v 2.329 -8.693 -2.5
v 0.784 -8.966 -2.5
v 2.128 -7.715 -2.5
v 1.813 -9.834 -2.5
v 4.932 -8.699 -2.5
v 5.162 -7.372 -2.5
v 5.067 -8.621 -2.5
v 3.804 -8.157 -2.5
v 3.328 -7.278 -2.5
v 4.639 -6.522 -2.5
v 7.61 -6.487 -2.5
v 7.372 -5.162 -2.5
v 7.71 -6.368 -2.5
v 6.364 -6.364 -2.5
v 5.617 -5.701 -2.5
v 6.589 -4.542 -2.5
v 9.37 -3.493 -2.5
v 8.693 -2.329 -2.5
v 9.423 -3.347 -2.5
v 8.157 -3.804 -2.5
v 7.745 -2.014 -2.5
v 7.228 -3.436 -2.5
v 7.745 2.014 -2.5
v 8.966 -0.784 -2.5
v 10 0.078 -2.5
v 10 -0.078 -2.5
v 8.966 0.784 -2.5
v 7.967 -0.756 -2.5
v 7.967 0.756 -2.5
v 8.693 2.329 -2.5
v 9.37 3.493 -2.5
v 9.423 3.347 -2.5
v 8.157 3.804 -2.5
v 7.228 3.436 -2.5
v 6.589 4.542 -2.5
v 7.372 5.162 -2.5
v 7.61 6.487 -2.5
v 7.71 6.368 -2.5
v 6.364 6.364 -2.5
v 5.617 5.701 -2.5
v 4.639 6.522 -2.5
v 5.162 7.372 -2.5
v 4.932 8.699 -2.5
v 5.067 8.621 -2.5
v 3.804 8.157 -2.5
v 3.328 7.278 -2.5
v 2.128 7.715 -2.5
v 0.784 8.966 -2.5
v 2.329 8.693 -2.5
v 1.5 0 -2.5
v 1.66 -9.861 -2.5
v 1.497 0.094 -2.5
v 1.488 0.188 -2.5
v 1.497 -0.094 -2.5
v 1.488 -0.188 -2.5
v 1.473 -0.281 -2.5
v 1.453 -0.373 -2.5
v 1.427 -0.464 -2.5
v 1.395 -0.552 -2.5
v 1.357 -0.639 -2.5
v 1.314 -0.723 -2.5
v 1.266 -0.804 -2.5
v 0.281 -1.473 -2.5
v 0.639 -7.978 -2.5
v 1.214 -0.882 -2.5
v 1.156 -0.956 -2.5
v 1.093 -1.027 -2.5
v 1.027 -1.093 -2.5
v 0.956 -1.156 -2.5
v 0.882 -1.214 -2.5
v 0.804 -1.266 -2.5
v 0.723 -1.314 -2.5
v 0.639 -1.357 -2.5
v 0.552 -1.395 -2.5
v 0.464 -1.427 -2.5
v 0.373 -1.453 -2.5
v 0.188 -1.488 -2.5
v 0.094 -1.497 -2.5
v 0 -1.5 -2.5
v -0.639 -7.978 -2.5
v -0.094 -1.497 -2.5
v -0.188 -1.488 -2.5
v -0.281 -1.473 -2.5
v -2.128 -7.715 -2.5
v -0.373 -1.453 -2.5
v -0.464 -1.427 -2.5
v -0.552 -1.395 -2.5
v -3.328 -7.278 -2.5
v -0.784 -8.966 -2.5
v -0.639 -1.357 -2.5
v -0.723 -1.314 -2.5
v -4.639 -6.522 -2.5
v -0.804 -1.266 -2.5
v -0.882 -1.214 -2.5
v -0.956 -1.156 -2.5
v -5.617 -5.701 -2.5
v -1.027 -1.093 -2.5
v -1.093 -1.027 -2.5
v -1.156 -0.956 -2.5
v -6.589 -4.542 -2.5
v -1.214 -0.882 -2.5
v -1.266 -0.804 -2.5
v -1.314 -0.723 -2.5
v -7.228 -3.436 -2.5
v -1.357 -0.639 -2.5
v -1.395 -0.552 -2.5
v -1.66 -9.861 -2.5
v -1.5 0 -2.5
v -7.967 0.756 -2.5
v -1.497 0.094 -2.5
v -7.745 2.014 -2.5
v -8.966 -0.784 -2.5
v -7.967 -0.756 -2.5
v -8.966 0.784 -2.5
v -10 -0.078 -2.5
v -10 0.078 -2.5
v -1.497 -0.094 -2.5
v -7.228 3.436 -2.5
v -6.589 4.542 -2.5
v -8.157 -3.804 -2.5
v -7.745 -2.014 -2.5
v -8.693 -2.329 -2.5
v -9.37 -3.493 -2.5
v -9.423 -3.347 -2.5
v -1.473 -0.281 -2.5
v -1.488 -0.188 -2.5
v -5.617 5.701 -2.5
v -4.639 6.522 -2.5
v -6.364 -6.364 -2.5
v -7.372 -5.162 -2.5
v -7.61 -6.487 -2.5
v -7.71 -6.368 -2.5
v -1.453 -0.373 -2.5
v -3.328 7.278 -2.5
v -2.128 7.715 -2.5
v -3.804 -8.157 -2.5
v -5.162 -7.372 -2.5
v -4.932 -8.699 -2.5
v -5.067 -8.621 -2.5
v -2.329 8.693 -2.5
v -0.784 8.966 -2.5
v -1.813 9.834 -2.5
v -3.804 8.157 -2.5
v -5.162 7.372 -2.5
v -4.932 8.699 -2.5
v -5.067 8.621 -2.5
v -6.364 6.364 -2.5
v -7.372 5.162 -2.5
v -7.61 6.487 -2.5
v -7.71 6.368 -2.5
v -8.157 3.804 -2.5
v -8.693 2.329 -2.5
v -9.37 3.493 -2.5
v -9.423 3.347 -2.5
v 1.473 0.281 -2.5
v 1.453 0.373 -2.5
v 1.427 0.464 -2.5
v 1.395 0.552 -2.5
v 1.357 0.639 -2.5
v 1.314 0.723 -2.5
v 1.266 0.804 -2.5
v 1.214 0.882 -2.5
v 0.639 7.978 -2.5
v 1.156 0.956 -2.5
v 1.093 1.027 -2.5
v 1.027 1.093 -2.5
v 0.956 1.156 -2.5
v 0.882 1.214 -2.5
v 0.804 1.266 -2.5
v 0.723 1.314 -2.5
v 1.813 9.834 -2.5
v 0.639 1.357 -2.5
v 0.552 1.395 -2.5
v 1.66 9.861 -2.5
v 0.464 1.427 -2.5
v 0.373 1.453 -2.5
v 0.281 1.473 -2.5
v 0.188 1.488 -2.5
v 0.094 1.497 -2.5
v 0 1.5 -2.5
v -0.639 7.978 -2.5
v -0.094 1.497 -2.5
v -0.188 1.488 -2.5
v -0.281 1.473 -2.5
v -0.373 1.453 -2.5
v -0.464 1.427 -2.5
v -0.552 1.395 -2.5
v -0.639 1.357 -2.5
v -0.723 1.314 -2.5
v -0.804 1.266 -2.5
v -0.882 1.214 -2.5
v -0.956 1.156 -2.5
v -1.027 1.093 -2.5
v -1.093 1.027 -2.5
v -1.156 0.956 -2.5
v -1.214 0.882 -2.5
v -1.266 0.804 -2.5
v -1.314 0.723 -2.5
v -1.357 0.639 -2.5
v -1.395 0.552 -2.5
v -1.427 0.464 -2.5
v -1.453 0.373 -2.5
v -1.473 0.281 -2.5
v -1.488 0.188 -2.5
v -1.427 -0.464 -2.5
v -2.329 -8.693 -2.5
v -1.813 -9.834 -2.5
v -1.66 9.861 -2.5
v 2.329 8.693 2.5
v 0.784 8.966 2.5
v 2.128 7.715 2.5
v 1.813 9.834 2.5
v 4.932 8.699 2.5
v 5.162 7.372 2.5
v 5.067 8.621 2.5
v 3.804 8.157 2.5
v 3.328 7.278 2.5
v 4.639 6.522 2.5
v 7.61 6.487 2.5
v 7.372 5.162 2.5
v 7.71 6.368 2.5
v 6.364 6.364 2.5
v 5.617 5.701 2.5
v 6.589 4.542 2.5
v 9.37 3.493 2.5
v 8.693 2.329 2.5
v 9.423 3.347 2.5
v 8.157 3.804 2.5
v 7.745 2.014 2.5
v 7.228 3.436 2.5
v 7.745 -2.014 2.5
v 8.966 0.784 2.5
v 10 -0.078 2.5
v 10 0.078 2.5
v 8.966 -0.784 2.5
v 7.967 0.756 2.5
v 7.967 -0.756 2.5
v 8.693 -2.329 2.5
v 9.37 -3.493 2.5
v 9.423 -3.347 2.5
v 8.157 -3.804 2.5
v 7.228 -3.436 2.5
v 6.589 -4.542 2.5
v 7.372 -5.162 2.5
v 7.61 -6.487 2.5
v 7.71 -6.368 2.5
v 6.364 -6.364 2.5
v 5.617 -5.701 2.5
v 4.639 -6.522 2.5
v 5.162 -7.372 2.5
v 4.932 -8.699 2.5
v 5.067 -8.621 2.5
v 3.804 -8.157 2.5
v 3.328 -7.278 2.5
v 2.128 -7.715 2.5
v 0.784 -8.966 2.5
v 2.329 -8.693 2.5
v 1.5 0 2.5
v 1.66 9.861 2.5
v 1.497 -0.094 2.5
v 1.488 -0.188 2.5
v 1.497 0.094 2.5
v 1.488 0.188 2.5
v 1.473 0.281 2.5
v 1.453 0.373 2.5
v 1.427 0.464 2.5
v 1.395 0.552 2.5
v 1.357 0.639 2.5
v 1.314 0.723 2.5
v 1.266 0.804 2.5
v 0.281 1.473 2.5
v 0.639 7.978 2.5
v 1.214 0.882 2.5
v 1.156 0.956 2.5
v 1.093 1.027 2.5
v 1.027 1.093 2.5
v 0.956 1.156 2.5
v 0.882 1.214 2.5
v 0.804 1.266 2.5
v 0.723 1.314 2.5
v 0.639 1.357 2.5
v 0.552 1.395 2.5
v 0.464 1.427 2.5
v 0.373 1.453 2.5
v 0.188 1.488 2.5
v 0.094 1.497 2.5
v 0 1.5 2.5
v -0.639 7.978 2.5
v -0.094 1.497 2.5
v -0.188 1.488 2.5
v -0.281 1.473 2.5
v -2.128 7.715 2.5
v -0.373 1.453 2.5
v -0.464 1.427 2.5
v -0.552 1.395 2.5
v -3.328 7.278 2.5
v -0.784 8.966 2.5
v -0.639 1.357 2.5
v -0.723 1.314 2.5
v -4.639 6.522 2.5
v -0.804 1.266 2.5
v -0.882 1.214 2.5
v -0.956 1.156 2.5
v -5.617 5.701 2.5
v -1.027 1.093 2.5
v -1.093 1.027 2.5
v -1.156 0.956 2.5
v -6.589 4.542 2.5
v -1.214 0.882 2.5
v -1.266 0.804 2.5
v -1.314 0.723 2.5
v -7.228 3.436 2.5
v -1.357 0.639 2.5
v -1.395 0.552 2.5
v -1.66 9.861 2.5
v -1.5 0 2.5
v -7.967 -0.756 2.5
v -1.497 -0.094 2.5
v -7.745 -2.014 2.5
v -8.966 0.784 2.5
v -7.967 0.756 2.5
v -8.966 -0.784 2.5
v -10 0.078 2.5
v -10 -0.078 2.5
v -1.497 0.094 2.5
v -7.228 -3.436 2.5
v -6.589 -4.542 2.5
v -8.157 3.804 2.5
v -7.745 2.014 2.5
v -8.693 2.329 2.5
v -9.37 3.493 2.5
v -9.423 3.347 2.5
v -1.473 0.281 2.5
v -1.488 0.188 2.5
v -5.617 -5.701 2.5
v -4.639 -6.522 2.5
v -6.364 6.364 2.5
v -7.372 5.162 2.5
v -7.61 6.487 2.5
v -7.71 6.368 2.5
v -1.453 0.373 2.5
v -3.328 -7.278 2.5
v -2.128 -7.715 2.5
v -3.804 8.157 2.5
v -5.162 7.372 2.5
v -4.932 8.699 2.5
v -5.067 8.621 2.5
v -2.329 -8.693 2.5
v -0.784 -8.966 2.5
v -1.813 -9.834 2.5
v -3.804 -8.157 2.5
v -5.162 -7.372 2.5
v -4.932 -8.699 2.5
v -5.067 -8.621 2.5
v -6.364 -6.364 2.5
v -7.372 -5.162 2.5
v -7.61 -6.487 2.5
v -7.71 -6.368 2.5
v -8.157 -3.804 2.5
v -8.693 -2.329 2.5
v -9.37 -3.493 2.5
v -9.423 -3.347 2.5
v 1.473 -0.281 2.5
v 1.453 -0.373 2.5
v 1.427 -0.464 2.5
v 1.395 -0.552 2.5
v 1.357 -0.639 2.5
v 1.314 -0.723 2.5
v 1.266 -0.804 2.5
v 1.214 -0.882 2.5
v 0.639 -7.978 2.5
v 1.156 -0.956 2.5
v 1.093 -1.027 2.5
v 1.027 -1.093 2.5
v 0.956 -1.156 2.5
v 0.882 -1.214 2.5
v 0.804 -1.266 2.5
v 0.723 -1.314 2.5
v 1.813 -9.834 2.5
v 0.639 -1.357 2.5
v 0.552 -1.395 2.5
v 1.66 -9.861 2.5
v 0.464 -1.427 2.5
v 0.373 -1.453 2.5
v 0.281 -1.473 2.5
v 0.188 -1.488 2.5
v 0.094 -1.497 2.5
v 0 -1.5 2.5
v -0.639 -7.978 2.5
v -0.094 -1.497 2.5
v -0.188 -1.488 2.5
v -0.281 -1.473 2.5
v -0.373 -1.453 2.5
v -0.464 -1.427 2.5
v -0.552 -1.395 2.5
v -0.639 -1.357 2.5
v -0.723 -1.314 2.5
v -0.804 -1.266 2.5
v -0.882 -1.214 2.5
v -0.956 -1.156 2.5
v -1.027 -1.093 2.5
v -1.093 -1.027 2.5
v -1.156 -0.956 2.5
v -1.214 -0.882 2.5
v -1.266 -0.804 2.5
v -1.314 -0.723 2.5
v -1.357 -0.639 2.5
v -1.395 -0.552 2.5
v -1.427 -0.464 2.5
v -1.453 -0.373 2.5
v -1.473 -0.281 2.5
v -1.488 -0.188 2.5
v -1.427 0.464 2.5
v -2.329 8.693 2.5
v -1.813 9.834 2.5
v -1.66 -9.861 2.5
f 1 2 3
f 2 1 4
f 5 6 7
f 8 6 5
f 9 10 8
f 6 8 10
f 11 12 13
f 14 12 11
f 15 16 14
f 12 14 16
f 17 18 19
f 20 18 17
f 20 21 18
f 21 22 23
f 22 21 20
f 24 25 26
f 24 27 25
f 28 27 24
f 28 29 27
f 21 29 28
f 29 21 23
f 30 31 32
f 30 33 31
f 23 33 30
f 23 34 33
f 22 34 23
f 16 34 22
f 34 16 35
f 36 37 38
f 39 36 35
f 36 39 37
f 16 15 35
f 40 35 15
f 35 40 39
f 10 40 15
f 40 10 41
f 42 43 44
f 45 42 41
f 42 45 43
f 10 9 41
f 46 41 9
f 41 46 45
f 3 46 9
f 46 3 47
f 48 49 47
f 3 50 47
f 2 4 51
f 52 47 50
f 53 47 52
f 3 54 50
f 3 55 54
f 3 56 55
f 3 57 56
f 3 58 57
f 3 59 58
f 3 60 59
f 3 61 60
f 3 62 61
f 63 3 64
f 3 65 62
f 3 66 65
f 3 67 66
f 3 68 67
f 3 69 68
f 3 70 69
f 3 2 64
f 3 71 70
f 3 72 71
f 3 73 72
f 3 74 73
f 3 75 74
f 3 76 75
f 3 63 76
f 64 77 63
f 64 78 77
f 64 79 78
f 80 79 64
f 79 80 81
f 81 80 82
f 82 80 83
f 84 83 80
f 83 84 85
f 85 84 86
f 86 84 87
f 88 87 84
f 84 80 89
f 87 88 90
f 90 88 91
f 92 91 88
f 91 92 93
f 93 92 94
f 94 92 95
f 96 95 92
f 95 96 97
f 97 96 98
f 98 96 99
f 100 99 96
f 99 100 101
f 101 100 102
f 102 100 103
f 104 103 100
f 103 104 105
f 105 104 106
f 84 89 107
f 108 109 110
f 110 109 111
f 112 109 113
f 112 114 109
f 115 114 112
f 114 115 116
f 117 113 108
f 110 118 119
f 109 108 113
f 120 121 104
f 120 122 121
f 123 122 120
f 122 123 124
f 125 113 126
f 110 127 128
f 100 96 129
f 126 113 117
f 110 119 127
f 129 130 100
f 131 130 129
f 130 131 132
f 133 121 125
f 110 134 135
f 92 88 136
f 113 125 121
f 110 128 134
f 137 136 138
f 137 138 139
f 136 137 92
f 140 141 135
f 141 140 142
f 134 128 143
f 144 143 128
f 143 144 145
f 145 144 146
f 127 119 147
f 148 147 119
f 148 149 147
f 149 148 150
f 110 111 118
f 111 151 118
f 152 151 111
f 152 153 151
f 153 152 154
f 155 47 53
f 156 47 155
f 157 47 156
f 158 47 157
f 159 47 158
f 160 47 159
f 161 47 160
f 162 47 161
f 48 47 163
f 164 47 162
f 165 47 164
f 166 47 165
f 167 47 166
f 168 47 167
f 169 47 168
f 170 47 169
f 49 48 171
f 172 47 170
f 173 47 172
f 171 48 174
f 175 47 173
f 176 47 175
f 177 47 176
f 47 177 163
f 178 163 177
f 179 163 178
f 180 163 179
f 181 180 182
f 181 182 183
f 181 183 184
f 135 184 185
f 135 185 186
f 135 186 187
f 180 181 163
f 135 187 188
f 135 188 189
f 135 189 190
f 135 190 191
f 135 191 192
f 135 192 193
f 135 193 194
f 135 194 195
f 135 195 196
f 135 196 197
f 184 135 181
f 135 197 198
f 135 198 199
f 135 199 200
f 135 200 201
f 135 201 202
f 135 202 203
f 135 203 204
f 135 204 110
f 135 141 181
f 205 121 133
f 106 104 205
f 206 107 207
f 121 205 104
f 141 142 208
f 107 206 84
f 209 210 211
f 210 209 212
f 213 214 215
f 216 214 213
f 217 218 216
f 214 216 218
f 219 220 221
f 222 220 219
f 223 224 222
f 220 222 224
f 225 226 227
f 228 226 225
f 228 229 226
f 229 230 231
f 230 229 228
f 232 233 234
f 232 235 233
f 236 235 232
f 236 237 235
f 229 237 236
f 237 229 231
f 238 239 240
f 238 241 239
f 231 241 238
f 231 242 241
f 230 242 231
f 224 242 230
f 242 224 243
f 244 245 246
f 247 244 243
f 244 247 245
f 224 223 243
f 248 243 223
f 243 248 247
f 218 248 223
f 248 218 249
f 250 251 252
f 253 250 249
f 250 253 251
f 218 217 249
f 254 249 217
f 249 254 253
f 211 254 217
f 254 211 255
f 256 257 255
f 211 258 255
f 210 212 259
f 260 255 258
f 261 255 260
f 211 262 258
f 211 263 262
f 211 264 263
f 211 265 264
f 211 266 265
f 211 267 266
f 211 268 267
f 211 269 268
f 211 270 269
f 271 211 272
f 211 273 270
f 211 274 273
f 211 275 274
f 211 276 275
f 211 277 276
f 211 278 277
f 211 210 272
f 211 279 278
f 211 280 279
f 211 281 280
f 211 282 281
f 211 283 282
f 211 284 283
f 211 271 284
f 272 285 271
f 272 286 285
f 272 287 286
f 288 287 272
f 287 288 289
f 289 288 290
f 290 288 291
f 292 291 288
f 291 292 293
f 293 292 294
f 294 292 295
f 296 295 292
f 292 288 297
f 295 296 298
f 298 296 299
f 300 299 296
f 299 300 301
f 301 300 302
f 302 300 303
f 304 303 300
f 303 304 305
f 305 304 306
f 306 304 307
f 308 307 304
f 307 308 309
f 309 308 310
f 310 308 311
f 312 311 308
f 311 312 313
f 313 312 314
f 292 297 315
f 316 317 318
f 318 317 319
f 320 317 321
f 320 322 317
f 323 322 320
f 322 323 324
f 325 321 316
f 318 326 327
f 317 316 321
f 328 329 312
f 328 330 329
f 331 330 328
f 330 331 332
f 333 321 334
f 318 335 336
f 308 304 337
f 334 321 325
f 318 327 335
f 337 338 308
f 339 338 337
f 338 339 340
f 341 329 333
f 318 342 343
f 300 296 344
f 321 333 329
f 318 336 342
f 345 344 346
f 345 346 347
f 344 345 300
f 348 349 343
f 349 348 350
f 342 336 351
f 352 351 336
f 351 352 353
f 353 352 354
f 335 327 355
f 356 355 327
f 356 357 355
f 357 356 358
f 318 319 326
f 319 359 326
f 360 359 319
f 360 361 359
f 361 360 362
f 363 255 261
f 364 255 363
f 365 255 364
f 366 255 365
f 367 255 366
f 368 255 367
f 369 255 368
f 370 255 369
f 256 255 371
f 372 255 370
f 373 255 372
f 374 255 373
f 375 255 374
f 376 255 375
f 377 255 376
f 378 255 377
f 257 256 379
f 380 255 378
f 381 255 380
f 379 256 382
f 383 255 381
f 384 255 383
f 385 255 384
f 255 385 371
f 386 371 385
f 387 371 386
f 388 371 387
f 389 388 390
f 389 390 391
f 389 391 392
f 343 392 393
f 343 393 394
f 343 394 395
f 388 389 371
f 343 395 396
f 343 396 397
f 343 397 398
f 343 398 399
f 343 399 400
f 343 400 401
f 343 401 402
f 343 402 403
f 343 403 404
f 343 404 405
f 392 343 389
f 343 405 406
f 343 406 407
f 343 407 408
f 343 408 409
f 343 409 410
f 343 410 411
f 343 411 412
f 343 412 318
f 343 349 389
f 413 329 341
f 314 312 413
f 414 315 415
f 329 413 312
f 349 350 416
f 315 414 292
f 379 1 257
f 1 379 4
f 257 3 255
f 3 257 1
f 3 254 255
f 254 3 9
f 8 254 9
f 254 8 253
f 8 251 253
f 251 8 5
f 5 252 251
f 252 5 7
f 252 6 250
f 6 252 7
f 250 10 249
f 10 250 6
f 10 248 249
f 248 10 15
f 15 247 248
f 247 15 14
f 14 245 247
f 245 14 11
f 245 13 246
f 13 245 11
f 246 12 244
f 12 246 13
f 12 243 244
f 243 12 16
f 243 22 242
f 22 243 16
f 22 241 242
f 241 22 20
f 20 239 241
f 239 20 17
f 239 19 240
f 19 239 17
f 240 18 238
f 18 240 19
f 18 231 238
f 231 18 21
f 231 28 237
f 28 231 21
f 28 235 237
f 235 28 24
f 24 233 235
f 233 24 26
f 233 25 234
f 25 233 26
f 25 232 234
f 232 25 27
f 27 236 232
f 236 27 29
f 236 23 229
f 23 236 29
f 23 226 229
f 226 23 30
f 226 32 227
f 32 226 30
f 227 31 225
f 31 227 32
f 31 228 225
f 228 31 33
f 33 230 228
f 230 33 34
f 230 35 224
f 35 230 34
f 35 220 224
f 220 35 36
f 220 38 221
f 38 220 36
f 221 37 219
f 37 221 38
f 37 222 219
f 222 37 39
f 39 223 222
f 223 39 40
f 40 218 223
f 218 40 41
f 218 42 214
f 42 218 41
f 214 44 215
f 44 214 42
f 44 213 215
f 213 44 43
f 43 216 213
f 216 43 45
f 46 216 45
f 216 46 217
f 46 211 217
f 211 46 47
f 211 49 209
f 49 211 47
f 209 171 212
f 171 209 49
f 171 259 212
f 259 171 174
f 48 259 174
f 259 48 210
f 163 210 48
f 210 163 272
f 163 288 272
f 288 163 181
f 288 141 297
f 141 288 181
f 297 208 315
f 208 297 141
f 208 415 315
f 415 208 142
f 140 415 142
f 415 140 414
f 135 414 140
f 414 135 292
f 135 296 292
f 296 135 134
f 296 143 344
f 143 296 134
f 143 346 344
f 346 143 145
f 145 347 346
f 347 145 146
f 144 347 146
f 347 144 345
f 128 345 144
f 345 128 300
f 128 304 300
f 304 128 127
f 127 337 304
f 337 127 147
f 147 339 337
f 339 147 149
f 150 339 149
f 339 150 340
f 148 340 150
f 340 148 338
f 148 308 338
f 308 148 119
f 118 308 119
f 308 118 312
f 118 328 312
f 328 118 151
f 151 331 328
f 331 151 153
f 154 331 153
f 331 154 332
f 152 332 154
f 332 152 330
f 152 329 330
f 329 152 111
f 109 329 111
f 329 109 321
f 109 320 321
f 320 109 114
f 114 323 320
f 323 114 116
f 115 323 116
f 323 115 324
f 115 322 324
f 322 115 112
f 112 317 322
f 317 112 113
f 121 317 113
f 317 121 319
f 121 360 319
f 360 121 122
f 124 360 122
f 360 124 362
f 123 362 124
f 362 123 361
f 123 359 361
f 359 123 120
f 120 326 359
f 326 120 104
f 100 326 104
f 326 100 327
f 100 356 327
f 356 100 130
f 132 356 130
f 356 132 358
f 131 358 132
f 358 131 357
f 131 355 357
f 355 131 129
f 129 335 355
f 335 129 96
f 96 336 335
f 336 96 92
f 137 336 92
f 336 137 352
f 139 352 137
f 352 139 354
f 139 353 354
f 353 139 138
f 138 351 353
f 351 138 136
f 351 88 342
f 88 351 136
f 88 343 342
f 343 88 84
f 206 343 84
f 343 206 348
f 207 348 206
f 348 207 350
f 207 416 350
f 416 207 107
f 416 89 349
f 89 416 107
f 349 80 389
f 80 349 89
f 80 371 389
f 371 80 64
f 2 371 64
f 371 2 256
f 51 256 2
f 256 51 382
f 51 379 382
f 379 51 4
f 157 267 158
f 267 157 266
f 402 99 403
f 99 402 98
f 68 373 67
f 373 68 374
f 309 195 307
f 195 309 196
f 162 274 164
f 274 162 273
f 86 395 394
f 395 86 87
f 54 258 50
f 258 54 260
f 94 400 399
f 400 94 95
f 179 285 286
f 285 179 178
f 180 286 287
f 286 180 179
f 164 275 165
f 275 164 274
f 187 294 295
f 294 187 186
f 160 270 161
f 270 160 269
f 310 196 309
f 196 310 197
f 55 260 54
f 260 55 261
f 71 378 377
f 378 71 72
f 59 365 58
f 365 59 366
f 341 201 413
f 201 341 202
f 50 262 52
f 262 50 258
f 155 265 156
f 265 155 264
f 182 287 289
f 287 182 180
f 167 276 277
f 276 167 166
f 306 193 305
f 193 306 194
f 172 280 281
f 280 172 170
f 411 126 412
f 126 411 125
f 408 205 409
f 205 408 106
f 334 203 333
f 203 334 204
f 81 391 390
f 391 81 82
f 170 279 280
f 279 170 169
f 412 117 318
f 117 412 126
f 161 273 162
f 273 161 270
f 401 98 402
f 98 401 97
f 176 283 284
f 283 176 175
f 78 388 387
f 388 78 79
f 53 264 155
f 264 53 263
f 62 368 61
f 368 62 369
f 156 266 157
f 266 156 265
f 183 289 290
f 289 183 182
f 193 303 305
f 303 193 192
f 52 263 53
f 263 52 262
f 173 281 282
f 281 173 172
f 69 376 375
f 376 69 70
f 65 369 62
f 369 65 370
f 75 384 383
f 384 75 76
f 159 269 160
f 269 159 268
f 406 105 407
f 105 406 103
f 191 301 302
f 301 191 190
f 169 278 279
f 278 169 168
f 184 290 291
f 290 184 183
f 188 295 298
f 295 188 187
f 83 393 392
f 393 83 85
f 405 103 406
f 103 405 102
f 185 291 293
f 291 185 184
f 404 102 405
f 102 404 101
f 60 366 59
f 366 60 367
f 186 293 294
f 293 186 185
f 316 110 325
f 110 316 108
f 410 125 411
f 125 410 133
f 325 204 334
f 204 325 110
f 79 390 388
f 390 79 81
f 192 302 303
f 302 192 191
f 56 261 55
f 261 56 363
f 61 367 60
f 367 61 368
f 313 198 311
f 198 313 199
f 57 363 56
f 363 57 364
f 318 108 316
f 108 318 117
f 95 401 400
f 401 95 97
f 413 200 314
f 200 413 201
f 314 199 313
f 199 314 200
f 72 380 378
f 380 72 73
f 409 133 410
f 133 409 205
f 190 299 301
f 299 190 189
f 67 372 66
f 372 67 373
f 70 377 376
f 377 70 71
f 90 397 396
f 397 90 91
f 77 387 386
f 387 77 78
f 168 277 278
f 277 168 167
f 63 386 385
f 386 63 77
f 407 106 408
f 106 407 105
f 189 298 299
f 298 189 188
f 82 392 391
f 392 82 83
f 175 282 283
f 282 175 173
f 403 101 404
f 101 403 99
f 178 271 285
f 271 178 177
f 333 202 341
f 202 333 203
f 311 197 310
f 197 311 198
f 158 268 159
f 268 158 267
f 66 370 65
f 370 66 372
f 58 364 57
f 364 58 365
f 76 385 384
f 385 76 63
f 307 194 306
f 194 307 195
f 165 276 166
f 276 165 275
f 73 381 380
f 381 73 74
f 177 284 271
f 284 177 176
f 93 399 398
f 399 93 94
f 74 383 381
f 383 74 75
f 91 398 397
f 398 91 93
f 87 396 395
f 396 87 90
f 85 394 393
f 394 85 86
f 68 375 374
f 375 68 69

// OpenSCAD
height = 5;
type = "Spur"; // [Spur,Cog,Double Helix, Single Helix]
teeth = 18;	//	[18:50]

hole = "Yes"; //[Yes,No]
rotate_Offset_double_Helix_only = 5; //[0:20]

holeSize = 1.5;//don't make too big or your gear will disappear
scale = 100;//this is here temperarily I would not reccomend changing!


if (type == "Spur")
{
if(hole == "Yes")
{
hole();
}
else
{
spur();
}
}
else if(type == "Cog")
{
if(hole == "Yes")
{
hole();
}
else
{
cog();
}
}
else if(type == "Double Helix")
{

if(hole == "Yes")
{
hole();
}
else
{
double_helix();
}
}
else if (type == "Single Helix")
{
if(hole == "Yes")
{
hole();
}
else
{
single_helix();
}
}


module gear(number_of_teeth,
		circular_pitch=false, diametral_pitch=false,
		pressure_angle=20, clearance = 0)
{

	//Convert diametrial pitch to our native circular pitch
	circular_pitch = (circular_pitch!=false?circular_pitch:180/diametral_pitch);

	// Pitch diameter: Diameter of pitch circle.
	pitch_diameter  =  number_of_teeth * circular_pitch / 180;
	pitch_radius = pitch_diameter/2;

	// Base Circle
	base_diameter = pitch_diameter*cos(pressure_angle);
	base_radius = base_diameter/2;

	// Diametrial pitch: Number of teeth per unit length.
	pitch_diametrial = number_of_teeth / pitch_diameter;

	// Addendum: Radial distance from pitch circle to outside circle.
	addendum = 1/pitch_diametrial;

	//Outer Circle
	outer_radius = pitch_radius+addendum;
	outer_diameter = outer_radius*2;

	// Dedendum: Radial distance from pitch circle to root diameter
	dedendum = addendum + clearance;

	// Root diameter: Diameter of bottom of tooth spaces.
	root_radius = pitch_radius-dedendum;
	root_diameter = root_radius * 2;

	half_thick_angle = 360 / (4 * number_of_teeth);

	union()
	{
		rotate(half_thick_angle) circle($fn=number_of_teeth*2, r=root_radius*1.001);

		for (i= [1:number_of_teeth])
		//for (i = [0])
		{
			rotate([0,0,i*360/number_of_teeth])
			{
				involute_gear_tooth(
					pitch_radius = pitch_radius,
					root_radius = root_radius,
					base_radius = base_radius-6,
					outer_radius = outer_radius,
					half_thick_angle = half_thick_angle);
			}
		}
	}
}


module involute_gear_tooth(
					pitch_radius,
					root_radius,
					base_radius,
					outer_radius,
					half_thick_angle
					)
{
	pitch_to_base_angle  = involute_intersect_angle( base_radius, pitch_radius );

	outer_to_base_angle = involute_intersect_angle( base_radius/2, outer_radius*1);

	base1 = 0 - pitch_to_base_angle - half_thick_angle;
	pitch1 = 0 - half_thick_angle;
	outer1 = outer_to_base_angle - pitch_to_base_angle - half_thick_angle;

	b1 = polar_to_cartesian([ base1, base_radius ]);
	p1 = polar_to_cartesian([ pitch1, pitch_radius ]);
	o1 = polar_to_cartesian([ outer1, outer_radius ]);

	b2 = polar_to_cartesian([ -base1, base_radius ]);
	p2 = polar_to_cartesian([ -pitch1, pitch_radius ]);
	o2 = polar_to_cartesian([ -outer1, outer_radius ]);

	// ( root_radius > base_radius variables )
		pitch_to_root_angle = pitch_to_base_angle - involute_intersect_angle(base_radius, root_radius );
		root1 = pitch1 - pitch_to_root_angle;
		root2 = -pitch1 + pitch_to_root_angle;
		r1_t =  polar_to_cartesian([ root1, root_radius ]);
		r2_t =  polar_to_cartesian([ -root1, root_radius ]);

	// ( else )
		r1_f =  polar_to_cartesian([ base1, root_radius ]);
		r2_f =  polar_to_cartesian([ -base1, root_radius ]);

	if (root_radius > base_radius)
	{
		//echo("true");
		polygon( points = [
			r1_t,p1,o1,o2,p2,r2_t
		], convexity = 3);
	}
	else
	{
		polygon( points = [
			r1_f, b1,p1,o1,o2,p2,b2,r2_f
		], convexity = 3);
	}

}

// Mathematical Functions
//===============

// Finds the angle of the involute about the base radius at the given distance (radius) from it's center.
//source: http://www.mathhelpforum.com/math-help/geometry/136011-circle-involute-solving-y-any-given-x.html

function involute_intersect_angle(base_radius, radius) = sqrt( pow(radius/base_radius,2) - 1);



// Polar coord [angle, radius] to cartesian coord [x,y]

function polar_to_cartesian(polar) = [
	polar[1]*cos(polar[0]),
	polar[1]*sin(polar[0])
];


// Test Cases
//===============

module test_gears()
{
	gear(number_of_teeth=51,circular_pitch=200);
	translate([0, 50])gear(number_of_teeth=17,circular_pitch=200);
	translate([-50,0]) gear(number_of_teeth=17,diametral_pitch=1);
}
module cog()
{
		gear(number_of_teeth=teeth,diametral_pitch=scale/100);

}
module single_helix()
{
	translate([50,0]);
	{
	linear_extrude(height = height, center = true, convexity = 10, twist = -45)
	 gear(number_of_teeth=teeth,diametral_pitch=scale/100);
	}
}
module double_helix()
{



linear_extrude(height = height, center = true, convexity = 10, twist = -45)
	 gear(number_of_teeth=teeth,diametral_pitch=scale/100);
	translate([0,0,height])
	rotate([0,0,rotate_Offset_double_Helix_only])
 linear_extrude(height = height, center = true, convexity = 10, twist = 45)
	 gear(number_of_teeth=teeth,diametral_pitch=scale/100);

}
module spur()
{

		translate([0,0]) linear_extrude(height = height, center = true, convexity = 10, twist = 0)
	 gear(number_of_teeth=teeth,diametral_pitch=1);


}

module demo_3d_gears()
{
	//double helical gear
	// (helics don't line up perfectly - for display purposes only ;)
	translate([50,0])
	{
	linear_extrude(height = 10, center = true, convexity = 10, twist = -45)
	 gear(number_of_teeth=17,diametral_pitch=1);
	translate([0,0,10]) linear_extrude(height = height, center = true, convexity = 10, twist = 45)
	 gear(number_of_teeth=17,diametral_pitch=1);
	}

	//spur gear
	translate([0,-50]) linear_extrude(height = height, center = true, convexity = 10, twist = 0)
	 gear(number_of_teeth=17,diametral_pitch=1);

}
module hole() {
   difference() {
if(type == "Spur")
{
translate([0,0]) linear_extrude(height = height, center = true, convexity = 10, twist = 0)
	 gear(number_of_teeth=teeth,diametral_pitch=1);
}
else if(type == "Cog")
{
gear(number_of_teeth=teeth,diametral_pitch=scale/100);
}
else if (type == "Double Helix")
{
linear_extrude(height = height, center = true, convexity = 10, twist = -45)
	 gear(number_of_teeth=teeth,diametral_pitch=scale/100);
	translate([0,0,height])
	rotate([0,0,rotate_Offset_double_Helix_only])
 linear_extrude(height = height, center = true, convexity = 10, twist = 45)
	 gear(number_of_teeth=teeth,diametral_pitch=scale/100);

}
else if (type == "Single Helix")
{
linear_extrude(height = height, center = true, convexity = 10, twist = -45)
	 gear(number_of_teeth=teeth,diametral_pitch=scale/100);
}
# rotate ([0,0,0]) cylinder (h = height*4, r=holeSize, center = true, $fn=100);
}
}




module test_involute_curve()
{
	for (i=[0,1,2,3,4,5,6,7,8,9,10,11,12,13,14,15])
	{
		translate(polar_to_cartesian([involute_intersect_angle( 0.1,i) , i ])) circle($fn=15, r=0.5);
	}
}
